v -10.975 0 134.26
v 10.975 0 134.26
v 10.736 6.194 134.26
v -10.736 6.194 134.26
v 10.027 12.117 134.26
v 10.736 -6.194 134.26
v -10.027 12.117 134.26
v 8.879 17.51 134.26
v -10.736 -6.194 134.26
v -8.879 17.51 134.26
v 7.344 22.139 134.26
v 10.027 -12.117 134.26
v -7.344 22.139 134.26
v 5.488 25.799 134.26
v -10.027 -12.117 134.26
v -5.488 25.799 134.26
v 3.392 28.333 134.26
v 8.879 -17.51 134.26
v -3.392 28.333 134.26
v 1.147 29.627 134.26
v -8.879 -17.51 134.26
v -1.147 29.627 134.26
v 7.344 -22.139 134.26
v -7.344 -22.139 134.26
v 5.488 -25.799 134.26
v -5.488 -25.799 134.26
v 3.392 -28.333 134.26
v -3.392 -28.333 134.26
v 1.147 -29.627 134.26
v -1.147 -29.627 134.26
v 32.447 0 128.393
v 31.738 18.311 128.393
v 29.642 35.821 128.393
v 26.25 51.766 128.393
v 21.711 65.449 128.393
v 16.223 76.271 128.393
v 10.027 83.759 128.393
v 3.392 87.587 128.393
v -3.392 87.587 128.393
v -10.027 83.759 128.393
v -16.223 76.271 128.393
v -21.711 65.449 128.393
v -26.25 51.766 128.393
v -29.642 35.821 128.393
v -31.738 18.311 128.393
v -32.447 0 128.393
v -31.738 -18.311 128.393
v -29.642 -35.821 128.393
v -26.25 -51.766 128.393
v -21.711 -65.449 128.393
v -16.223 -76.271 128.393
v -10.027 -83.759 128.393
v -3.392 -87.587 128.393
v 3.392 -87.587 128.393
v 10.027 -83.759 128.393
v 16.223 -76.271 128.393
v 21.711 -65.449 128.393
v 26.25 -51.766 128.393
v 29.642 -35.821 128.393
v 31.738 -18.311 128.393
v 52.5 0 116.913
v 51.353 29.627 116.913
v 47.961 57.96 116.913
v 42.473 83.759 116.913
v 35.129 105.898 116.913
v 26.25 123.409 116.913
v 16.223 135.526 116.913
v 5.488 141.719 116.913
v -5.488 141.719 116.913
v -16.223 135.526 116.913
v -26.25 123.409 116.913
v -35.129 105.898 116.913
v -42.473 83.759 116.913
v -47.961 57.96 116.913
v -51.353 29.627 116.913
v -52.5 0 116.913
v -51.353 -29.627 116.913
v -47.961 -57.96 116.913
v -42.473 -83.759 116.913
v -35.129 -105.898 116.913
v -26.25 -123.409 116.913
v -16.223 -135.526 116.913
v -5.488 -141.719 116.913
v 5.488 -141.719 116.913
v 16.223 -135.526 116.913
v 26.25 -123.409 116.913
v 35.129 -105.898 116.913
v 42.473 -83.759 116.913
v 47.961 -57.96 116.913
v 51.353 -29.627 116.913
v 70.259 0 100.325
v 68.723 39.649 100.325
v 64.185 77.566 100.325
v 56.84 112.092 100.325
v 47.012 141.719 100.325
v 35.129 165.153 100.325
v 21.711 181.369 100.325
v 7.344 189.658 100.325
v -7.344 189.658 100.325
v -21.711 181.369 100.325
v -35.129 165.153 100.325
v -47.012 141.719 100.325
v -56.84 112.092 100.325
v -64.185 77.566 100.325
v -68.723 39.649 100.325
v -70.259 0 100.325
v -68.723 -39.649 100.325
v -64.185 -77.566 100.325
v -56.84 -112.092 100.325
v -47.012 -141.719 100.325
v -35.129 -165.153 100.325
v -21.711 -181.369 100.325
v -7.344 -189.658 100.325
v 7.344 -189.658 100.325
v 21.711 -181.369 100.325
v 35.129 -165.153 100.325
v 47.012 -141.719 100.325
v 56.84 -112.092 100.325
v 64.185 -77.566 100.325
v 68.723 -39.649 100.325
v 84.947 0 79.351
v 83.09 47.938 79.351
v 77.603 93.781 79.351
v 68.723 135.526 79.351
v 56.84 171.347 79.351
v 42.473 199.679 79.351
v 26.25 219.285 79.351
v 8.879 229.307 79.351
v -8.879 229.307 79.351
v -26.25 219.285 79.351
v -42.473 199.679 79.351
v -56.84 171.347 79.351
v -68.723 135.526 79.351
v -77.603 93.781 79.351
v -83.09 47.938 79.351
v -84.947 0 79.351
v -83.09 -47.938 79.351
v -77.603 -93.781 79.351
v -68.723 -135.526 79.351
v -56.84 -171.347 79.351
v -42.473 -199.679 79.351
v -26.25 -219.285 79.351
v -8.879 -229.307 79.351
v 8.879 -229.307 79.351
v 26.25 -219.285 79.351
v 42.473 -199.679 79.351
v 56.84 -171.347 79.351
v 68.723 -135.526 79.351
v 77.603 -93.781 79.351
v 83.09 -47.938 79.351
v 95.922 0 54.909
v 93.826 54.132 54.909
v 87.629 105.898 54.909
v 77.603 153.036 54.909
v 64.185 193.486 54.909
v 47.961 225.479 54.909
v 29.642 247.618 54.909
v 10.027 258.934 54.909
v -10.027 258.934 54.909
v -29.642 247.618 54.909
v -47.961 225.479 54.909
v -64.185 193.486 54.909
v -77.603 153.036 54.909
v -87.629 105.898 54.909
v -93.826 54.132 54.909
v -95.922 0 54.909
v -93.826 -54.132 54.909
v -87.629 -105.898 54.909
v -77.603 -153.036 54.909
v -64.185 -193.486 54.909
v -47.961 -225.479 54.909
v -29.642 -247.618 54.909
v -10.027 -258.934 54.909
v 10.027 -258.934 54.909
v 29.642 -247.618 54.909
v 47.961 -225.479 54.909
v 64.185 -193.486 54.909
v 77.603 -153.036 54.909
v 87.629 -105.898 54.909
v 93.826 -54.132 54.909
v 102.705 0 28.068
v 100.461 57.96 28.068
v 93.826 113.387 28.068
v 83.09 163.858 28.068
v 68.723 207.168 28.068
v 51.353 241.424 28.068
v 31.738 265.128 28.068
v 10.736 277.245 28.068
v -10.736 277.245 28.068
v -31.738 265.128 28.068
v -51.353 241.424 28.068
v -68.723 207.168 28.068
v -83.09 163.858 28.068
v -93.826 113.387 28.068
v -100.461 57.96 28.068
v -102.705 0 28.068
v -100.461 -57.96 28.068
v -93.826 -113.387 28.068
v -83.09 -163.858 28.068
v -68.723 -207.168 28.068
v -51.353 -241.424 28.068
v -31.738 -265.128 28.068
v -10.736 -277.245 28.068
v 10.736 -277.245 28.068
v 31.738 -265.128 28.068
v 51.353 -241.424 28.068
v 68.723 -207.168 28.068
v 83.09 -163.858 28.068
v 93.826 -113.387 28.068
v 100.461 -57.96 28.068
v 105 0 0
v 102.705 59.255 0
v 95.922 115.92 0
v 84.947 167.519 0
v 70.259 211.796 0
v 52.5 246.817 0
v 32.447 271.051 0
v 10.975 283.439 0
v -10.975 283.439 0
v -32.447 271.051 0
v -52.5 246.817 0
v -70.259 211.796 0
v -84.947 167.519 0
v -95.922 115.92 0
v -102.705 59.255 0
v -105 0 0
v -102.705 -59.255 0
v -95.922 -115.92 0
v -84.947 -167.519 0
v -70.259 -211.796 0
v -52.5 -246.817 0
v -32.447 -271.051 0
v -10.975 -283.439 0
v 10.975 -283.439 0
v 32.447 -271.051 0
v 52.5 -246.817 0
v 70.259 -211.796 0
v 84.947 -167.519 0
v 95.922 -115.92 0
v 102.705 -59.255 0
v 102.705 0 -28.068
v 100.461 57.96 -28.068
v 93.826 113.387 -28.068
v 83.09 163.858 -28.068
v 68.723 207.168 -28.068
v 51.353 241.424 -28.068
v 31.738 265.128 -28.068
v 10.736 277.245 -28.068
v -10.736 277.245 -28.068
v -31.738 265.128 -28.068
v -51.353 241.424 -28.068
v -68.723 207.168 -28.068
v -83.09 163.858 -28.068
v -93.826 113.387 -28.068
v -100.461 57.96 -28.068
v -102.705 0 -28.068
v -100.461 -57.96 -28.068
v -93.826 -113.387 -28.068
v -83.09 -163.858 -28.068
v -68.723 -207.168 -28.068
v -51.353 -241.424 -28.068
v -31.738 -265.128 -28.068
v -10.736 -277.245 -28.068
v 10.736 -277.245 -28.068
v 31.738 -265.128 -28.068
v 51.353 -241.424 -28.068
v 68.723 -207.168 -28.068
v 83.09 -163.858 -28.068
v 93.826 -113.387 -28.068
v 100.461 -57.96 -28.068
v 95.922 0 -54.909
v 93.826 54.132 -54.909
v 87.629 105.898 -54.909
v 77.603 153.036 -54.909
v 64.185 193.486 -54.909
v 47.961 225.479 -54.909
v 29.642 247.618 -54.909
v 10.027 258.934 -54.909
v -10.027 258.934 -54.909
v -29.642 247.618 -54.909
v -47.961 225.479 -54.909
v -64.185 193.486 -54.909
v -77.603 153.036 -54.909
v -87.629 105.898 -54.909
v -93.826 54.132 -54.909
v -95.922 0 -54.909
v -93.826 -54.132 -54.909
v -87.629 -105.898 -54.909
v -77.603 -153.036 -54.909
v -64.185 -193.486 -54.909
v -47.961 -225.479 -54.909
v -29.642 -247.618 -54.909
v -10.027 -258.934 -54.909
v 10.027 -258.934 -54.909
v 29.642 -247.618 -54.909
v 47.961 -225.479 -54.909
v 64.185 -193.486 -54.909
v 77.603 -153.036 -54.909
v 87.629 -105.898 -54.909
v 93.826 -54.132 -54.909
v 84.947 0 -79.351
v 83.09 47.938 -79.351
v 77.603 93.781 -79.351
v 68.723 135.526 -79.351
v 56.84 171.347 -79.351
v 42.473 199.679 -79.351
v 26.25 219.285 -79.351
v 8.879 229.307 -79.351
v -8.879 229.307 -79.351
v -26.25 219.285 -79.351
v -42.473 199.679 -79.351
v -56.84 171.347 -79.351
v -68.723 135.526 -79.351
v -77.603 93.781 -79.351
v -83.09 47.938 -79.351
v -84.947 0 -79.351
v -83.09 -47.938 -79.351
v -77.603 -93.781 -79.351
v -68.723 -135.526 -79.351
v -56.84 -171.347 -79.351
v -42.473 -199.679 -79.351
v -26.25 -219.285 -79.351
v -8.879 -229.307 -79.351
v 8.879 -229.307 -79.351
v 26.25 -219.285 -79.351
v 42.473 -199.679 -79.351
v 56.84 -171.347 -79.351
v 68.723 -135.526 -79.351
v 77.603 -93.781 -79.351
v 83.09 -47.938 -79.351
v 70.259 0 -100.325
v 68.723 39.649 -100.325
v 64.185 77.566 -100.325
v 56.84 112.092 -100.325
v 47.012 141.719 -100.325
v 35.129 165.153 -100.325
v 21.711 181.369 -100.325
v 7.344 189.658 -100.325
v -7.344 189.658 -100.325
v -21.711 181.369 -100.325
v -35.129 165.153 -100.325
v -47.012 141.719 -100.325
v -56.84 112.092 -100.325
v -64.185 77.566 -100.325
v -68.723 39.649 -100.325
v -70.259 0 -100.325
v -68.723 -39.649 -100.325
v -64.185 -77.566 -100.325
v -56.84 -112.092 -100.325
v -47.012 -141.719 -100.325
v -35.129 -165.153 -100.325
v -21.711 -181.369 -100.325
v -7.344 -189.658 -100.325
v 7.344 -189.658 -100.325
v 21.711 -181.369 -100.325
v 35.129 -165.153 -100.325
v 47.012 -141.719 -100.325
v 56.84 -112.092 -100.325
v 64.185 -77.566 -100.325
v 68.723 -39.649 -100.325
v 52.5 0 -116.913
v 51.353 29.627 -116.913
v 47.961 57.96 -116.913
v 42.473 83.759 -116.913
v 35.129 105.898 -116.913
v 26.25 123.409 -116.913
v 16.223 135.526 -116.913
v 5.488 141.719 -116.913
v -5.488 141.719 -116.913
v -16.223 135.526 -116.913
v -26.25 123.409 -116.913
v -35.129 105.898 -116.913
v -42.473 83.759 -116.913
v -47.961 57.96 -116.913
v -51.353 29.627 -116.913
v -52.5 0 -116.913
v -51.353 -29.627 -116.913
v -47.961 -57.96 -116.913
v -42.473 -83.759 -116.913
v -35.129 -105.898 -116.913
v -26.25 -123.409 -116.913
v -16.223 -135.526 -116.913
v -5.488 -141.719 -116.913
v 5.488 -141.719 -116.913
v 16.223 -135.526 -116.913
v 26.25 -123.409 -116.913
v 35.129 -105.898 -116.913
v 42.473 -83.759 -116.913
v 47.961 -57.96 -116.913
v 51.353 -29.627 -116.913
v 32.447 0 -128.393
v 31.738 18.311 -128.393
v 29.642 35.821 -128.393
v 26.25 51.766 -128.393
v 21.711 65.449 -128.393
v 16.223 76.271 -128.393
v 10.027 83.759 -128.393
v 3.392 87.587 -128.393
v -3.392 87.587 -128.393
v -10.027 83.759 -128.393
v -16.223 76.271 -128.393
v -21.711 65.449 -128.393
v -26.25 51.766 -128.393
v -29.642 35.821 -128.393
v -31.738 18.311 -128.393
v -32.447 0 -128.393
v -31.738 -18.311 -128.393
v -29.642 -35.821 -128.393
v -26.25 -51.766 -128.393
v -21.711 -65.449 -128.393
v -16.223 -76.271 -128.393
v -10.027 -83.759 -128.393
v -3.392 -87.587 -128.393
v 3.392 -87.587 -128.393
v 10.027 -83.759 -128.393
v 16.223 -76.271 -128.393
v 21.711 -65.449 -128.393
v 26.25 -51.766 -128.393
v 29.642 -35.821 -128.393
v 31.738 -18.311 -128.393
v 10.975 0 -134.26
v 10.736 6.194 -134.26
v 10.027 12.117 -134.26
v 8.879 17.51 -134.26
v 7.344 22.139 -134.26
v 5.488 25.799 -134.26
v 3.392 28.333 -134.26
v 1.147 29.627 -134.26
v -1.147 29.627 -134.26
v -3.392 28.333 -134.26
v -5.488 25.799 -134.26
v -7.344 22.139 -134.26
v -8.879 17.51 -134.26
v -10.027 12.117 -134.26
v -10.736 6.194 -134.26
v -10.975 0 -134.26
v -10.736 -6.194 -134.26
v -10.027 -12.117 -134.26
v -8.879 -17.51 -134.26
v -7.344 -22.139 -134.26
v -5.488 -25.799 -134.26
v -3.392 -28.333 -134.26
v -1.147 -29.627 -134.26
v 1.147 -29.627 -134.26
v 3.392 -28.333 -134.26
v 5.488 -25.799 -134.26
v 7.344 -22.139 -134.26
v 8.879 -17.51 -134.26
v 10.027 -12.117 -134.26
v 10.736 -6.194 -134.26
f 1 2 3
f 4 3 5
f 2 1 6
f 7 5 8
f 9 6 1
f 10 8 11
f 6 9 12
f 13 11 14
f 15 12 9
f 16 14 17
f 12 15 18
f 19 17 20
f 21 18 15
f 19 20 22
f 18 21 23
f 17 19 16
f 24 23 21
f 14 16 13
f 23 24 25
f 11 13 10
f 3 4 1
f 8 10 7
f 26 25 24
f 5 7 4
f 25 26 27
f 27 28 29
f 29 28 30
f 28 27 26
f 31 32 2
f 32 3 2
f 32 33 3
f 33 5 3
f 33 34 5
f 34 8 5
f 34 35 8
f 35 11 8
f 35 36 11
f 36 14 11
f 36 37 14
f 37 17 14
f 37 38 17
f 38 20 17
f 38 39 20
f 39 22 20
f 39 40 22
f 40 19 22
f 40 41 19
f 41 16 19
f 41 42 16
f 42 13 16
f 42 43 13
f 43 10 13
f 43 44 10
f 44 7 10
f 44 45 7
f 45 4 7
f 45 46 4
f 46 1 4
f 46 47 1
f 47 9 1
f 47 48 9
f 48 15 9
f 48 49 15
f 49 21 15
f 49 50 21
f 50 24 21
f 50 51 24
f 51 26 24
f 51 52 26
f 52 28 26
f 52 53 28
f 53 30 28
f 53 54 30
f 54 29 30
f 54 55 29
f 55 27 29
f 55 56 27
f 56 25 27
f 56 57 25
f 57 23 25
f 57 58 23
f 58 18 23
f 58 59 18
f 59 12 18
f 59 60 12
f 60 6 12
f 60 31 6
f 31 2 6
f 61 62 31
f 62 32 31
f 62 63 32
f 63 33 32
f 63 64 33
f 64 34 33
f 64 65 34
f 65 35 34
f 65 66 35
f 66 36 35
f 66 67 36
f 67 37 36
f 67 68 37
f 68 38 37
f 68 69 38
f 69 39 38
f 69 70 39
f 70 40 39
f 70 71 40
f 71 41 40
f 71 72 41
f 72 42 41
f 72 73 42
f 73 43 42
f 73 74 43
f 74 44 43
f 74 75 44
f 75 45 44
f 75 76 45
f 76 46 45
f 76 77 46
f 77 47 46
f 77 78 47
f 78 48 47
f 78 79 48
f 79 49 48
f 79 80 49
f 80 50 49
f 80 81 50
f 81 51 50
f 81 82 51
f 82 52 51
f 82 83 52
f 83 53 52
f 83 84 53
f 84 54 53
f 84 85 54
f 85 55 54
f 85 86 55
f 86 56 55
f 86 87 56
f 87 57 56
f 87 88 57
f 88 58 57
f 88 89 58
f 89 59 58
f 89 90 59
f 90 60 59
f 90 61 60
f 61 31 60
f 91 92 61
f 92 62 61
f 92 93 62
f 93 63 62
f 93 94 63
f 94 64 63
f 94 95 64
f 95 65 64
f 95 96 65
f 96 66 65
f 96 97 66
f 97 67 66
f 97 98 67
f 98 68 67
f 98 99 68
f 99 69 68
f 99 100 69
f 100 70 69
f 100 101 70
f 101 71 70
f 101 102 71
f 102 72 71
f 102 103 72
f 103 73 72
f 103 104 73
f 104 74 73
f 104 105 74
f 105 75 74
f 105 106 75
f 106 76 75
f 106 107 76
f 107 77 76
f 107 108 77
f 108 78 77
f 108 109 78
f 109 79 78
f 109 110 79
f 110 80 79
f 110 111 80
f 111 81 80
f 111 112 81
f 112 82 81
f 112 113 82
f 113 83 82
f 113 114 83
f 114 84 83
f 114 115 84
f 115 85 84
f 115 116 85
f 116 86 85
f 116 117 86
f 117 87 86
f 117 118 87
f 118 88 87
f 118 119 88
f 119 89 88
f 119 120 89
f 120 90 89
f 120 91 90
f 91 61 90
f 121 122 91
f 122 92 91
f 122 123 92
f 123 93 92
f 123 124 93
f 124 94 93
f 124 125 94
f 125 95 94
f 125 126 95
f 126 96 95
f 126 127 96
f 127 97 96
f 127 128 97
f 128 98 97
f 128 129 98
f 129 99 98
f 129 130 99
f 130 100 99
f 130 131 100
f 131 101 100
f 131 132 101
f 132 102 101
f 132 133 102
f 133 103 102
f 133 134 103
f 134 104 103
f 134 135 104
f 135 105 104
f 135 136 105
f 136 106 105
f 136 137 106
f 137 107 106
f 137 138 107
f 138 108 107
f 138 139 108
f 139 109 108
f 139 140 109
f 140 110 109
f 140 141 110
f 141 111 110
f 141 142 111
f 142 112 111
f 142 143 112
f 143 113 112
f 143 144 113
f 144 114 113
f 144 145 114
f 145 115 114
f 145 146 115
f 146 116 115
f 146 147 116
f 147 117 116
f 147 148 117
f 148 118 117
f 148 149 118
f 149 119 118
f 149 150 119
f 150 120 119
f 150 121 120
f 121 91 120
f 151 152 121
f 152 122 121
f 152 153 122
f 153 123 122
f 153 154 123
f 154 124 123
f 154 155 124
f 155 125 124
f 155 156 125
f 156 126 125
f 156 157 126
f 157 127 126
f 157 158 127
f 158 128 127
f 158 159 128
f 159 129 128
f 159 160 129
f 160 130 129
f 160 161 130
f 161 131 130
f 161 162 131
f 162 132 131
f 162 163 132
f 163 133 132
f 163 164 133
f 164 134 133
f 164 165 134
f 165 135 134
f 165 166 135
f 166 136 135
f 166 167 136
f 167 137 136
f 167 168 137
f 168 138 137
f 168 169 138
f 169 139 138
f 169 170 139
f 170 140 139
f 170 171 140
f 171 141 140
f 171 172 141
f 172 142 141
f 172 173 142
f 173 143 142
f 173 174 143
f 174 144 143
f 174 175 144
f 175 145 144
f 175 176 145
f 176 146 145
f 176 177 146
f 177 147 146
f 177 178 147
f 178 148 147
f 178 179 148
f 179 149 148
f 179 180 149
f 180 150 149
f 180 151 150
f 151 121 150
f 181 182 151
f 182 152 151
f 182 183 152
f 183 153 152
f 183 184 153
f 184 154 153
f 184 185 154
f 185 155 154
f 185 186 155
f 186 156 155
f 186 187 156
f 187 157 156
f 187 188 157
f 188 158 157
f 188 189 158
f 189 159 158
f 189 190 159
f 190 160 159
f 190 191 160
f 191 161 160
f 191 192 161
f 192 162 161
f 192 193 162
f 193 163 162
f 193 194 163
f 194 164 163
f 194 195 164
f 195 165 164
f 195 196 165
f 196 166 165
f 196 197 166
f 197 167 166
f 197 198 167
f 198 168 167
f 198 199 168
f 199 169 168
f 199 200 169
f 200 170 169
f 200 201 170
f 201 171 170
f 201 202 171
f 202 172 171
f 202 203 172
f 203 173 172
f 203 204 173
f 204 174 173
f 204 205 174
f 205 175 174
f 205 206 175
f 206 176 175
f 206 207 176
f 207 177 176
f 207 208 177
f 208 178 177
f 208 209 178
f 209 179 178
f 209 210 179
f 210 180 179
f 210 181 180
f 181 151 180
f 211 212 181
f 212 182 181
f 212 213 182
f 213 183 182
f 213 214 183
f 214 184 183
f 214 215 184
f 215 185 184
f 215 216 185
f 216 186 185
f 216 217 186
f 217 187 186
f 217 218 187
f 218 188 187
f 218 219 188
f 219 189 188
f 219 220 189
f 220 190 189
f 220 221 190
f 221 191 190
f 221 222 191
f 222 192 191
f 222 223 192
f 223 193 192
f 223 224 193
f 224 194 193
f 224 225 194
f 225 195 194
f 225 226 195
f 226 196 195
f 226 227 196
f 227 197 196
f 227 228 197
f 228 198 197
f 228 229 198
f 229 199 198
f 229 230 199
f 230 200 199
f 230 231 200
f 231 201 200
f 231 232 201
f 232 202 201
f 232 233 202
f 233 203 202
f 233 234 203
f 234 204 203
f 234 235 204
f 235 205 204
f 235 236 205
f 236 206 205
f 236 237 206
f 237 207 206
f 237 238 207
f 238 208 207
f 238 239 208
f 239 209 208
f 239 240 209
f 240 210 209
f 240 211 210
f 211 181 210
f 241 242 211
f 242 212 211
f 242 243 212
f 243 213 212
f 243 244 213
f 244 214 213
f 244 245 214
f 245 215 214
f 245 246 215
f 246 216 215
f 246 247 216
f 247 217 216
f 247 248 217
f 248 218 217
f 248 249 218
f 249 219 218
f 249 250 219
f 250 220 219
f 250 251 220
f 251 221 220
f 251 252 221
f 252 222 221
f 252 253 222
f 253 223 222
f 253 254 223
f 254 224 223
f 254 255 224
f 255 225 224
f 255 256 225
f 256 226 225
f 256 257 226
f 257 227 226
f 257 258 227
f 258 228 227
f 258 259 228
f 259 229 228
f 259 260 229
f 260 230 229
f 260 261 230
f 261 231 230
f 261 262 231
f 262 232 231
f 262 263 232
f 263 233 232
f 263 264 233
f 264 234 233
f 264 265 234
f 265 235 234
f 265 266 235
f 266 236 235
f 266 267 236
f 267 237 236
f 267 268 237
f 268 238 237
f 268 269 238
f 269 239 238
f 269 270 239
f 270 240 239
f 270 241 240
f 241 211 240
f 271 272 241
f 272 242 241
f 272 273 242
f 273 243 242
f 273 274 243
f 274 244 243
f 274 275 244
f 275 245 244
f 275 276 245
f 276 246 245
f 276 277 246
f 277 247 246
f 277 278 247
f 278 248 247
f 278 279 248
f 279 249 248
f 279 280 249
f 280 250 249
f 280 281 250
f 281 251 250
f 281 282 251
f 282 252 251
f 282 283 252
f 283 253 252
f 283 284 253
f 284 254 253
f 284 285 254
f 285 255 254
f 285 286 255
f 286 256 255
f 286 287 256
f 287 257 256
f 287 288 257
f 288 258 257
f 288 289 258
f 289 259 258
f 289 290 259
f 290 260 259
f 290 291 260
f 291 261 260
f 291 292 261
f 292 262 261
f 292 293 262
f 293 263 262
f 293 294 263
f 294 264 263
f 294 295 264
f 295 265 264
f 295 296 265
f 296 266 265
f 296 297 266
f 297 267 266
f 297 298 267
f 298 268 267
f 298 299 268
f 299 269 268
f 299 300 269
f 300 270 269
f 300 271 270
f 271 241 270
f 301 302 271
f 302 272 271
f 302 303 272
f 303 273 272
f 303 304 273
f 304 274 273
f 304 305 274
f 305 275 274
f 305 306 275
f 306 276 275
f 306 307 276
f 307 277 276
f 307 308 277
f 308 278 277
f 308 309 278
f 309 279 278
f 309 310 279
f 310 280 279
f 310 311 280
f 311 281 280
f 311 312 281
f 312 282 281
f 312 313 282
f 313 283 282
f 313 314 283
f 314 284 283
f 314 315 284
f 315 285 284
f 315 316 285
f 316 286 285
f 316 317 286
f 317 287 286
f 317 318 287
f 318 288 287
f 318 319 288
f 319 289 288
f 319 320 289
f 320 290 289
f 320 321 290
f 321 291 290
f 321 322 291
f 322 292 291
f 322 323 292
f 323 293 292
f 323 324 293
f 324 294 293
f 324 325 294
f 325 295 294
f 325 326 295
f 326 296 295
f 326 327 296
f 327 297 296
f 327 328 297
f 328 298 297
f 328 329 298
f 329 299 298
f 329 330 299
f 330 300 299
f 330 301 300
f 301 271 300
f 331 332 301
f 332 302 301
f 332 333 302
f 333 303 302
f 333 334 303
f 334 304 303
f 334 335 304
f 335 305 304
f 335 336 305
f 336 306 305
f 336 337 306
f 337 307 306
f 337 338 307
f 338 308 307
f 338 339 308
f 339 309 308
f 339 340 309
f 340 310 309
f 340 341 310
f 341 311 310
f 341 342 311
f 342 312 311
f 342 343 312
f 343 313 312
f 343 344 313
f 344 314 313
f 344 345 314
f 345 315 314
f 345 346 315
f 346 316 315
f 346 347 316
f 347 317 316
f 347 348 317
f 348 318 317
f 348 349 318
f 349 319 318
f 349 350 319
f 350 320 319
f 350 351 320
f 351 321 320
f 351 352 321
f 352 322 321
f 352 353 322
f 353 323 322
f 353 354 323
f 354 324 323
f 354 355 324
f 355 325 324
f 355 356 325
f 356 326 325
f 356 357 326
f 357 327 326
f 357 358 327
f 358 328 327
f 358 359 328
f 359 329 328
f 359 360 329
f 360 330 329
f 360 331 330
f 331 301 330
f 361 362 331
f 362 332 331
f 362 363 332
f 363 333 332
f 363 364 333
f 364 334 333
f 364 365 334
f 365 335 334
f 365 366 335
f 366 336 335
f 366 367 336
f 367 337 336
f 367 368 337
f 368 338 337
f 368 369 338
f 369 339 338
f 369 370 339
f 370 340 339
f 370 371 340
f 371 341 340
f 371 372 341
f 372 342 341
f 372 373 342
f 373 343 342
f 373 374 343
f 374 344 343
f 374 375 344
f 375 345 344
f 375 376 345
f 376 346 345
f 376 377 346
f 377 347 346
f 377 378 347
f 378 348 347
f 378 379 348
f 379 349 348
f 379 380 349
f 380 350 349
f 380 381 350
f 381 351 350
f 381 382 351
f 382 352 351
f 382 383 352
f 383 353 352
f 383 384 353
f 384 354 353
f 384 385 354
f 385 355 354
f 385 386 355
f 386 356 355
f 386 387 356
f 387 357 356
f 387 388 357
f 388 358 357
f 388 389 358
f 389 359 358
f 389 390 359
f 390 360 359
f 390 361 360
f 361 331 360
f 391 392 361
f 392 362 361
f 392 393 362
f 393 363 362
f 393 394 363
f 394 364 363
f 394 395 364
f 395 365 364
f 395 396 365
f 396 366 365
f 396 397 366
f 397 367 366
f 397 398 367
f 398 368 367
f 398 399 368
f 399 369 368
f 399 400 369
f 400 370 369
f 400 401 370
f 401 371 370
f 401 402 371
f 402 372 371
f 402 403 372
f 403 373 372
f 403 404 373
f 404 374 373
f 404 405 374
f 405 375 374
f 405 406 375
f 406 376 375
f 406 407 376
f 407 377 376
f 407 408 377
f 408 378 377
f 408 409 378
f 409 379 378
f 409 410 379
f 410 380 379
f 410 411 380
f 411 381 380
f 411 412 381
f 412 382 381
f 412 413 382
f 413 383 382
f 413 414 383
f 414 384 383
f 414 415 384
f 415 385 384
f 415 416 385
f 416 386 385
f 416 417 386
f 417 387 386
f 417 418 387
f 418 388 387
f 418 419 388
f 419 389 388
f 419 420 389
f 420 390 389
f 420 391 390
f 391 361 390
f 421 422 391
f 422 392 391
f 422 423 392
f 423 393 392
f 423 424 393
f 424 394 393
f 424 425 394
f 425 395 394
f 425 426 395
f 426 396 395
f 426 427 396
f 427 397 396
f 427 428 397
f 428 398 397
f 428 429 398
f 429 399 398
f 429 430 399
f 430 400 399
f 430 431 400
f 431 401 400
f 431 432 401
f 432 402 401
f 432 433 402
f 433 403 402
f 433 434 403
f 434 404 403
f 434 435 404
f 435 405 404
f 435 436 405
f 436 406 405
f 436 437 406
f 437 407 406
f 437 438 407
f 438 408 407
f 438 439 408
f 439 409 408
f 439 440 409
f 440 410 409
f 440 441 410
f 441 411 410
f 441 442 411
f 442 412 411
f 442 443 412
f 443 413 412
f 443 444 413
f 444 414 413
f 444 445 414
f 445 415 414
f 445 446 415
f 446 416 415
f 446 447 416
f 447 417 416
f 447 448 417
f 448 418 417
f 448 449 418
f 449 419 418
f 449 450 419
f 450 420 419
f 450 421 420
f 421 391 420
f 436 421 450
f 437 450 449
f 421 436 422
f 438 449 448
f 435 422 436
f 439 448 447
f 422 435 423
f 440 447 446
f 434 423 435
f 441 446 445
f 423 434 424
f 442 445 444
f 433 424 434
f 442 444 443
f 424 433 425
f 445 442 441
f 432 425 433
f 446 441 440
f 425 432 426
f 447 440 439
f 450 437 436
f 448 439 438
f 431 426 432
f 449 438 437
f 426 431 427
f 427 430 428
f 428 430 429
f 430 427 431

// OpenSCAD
// Generated by SolidPython 1.0.1 on 2020-07-29 00:46:48


scale(v = [7, 19, 9]) {
	sphere(r = 15);
}
/***********************************************
*********      SolidPython code:      **********
************************************************
 
# import packages: SolidPython
from solid import *
from solid.utils import *
from itertools import chain, combinations, permutations


class Resize:

    def __init__(self, scad_file):
        self.scad_file = scad_file
        #self.scad_file = import_scad(scad_file)
        # cone/cylinder param:
        self.r1 = 0
        self.r2 = 0
        self.h = 0
        # rectangular prism param:
        self.w = 0
        self.l = 0
        # ellipse param:
        self.r = 0

    # import OpenScad code (file name corresponds to shape)


    # classify shape + parameters
    def assign(self, param1, param2, param3):
        if self.scad_file == 'cone.scad':
            self.r1 = param1
            self.r2 = param2
            self.h = param3
        elif self.scad_file == 'cylinder.scad':
            self.r1 = param1
            self.r2 = param2
            self.h = param3
        elif self.scad_file == 'rectangularPrism.scad':
            self.h = param1
            self.l = param2
            self.w = param3
        else:
            self.r = param1
            self.h = param2

    # resize parameters
    def iterate(self):
        x = range(3, 20, 2)
        i = 1
        if self.scad_file == 'cone.scad':
            tempList = list(permutations(x, 2))
            for temp in tempList:
                param1 = temp[0]
                param2 = temp[1]
                filepath = 'produced_scad_files/' + 'cone' + str(param1) + '_' + str(param2) + '_' + '.scad'
                scad_render_to_file(cylinder(h=param1, r1=param2, r2=0), filepath)

        elif self.scad_file == 'cylinder.scad':
            tempList = list(permutations(x, 3))
            for temp in tempList:
                param1 = temp[0]
                param2 = temp[1]
                filepath = 'produced_scad_files/' + 'cylinder' + str(param1) + '_' + str(param2) + '_' + '.scad'
                scad_render_to_file(cylinder(h=param1, r1=param2, r2=param2), filepath)

        elif self.scad_file == 'rectangularPrism.scad':
            tempList = list(permutations(x, 3))
            for temp in tempList:
                param1 = temp[0]
                param2 = temp[1]
                param3 = temp[2]
                filepath = 'produced_scad_files/' + 'rectangularPrism' + str(param1) + '_' + str(param2) + '_' + str(
                    param3) + '.scad'
                scad_render_to_file(cube(size=(param1, param2, param3)), filepath)

        elif self.scad_file == 'ellipse.scad':
            tempList = list(permutations(x, 4))
            for temp in tempList:
                param1 = temp[0]
                param2 = temp[1]
                param3 = temp[2]
                param4 = temp[3]
                filepath = 'produced_scad_files/' + 'ellipse' + str(param1) + '_' + str(param2) + '_' + str(param3) + '_' + str(param4) + '.scad'
                scad_render_to_file(scale([param1, param2, param3])(sphere(r=param4)), filepath)

    def render_to_scadfile(self):
        scad_render_to_file(scad, 'example.scad') 
 
************************************************/
